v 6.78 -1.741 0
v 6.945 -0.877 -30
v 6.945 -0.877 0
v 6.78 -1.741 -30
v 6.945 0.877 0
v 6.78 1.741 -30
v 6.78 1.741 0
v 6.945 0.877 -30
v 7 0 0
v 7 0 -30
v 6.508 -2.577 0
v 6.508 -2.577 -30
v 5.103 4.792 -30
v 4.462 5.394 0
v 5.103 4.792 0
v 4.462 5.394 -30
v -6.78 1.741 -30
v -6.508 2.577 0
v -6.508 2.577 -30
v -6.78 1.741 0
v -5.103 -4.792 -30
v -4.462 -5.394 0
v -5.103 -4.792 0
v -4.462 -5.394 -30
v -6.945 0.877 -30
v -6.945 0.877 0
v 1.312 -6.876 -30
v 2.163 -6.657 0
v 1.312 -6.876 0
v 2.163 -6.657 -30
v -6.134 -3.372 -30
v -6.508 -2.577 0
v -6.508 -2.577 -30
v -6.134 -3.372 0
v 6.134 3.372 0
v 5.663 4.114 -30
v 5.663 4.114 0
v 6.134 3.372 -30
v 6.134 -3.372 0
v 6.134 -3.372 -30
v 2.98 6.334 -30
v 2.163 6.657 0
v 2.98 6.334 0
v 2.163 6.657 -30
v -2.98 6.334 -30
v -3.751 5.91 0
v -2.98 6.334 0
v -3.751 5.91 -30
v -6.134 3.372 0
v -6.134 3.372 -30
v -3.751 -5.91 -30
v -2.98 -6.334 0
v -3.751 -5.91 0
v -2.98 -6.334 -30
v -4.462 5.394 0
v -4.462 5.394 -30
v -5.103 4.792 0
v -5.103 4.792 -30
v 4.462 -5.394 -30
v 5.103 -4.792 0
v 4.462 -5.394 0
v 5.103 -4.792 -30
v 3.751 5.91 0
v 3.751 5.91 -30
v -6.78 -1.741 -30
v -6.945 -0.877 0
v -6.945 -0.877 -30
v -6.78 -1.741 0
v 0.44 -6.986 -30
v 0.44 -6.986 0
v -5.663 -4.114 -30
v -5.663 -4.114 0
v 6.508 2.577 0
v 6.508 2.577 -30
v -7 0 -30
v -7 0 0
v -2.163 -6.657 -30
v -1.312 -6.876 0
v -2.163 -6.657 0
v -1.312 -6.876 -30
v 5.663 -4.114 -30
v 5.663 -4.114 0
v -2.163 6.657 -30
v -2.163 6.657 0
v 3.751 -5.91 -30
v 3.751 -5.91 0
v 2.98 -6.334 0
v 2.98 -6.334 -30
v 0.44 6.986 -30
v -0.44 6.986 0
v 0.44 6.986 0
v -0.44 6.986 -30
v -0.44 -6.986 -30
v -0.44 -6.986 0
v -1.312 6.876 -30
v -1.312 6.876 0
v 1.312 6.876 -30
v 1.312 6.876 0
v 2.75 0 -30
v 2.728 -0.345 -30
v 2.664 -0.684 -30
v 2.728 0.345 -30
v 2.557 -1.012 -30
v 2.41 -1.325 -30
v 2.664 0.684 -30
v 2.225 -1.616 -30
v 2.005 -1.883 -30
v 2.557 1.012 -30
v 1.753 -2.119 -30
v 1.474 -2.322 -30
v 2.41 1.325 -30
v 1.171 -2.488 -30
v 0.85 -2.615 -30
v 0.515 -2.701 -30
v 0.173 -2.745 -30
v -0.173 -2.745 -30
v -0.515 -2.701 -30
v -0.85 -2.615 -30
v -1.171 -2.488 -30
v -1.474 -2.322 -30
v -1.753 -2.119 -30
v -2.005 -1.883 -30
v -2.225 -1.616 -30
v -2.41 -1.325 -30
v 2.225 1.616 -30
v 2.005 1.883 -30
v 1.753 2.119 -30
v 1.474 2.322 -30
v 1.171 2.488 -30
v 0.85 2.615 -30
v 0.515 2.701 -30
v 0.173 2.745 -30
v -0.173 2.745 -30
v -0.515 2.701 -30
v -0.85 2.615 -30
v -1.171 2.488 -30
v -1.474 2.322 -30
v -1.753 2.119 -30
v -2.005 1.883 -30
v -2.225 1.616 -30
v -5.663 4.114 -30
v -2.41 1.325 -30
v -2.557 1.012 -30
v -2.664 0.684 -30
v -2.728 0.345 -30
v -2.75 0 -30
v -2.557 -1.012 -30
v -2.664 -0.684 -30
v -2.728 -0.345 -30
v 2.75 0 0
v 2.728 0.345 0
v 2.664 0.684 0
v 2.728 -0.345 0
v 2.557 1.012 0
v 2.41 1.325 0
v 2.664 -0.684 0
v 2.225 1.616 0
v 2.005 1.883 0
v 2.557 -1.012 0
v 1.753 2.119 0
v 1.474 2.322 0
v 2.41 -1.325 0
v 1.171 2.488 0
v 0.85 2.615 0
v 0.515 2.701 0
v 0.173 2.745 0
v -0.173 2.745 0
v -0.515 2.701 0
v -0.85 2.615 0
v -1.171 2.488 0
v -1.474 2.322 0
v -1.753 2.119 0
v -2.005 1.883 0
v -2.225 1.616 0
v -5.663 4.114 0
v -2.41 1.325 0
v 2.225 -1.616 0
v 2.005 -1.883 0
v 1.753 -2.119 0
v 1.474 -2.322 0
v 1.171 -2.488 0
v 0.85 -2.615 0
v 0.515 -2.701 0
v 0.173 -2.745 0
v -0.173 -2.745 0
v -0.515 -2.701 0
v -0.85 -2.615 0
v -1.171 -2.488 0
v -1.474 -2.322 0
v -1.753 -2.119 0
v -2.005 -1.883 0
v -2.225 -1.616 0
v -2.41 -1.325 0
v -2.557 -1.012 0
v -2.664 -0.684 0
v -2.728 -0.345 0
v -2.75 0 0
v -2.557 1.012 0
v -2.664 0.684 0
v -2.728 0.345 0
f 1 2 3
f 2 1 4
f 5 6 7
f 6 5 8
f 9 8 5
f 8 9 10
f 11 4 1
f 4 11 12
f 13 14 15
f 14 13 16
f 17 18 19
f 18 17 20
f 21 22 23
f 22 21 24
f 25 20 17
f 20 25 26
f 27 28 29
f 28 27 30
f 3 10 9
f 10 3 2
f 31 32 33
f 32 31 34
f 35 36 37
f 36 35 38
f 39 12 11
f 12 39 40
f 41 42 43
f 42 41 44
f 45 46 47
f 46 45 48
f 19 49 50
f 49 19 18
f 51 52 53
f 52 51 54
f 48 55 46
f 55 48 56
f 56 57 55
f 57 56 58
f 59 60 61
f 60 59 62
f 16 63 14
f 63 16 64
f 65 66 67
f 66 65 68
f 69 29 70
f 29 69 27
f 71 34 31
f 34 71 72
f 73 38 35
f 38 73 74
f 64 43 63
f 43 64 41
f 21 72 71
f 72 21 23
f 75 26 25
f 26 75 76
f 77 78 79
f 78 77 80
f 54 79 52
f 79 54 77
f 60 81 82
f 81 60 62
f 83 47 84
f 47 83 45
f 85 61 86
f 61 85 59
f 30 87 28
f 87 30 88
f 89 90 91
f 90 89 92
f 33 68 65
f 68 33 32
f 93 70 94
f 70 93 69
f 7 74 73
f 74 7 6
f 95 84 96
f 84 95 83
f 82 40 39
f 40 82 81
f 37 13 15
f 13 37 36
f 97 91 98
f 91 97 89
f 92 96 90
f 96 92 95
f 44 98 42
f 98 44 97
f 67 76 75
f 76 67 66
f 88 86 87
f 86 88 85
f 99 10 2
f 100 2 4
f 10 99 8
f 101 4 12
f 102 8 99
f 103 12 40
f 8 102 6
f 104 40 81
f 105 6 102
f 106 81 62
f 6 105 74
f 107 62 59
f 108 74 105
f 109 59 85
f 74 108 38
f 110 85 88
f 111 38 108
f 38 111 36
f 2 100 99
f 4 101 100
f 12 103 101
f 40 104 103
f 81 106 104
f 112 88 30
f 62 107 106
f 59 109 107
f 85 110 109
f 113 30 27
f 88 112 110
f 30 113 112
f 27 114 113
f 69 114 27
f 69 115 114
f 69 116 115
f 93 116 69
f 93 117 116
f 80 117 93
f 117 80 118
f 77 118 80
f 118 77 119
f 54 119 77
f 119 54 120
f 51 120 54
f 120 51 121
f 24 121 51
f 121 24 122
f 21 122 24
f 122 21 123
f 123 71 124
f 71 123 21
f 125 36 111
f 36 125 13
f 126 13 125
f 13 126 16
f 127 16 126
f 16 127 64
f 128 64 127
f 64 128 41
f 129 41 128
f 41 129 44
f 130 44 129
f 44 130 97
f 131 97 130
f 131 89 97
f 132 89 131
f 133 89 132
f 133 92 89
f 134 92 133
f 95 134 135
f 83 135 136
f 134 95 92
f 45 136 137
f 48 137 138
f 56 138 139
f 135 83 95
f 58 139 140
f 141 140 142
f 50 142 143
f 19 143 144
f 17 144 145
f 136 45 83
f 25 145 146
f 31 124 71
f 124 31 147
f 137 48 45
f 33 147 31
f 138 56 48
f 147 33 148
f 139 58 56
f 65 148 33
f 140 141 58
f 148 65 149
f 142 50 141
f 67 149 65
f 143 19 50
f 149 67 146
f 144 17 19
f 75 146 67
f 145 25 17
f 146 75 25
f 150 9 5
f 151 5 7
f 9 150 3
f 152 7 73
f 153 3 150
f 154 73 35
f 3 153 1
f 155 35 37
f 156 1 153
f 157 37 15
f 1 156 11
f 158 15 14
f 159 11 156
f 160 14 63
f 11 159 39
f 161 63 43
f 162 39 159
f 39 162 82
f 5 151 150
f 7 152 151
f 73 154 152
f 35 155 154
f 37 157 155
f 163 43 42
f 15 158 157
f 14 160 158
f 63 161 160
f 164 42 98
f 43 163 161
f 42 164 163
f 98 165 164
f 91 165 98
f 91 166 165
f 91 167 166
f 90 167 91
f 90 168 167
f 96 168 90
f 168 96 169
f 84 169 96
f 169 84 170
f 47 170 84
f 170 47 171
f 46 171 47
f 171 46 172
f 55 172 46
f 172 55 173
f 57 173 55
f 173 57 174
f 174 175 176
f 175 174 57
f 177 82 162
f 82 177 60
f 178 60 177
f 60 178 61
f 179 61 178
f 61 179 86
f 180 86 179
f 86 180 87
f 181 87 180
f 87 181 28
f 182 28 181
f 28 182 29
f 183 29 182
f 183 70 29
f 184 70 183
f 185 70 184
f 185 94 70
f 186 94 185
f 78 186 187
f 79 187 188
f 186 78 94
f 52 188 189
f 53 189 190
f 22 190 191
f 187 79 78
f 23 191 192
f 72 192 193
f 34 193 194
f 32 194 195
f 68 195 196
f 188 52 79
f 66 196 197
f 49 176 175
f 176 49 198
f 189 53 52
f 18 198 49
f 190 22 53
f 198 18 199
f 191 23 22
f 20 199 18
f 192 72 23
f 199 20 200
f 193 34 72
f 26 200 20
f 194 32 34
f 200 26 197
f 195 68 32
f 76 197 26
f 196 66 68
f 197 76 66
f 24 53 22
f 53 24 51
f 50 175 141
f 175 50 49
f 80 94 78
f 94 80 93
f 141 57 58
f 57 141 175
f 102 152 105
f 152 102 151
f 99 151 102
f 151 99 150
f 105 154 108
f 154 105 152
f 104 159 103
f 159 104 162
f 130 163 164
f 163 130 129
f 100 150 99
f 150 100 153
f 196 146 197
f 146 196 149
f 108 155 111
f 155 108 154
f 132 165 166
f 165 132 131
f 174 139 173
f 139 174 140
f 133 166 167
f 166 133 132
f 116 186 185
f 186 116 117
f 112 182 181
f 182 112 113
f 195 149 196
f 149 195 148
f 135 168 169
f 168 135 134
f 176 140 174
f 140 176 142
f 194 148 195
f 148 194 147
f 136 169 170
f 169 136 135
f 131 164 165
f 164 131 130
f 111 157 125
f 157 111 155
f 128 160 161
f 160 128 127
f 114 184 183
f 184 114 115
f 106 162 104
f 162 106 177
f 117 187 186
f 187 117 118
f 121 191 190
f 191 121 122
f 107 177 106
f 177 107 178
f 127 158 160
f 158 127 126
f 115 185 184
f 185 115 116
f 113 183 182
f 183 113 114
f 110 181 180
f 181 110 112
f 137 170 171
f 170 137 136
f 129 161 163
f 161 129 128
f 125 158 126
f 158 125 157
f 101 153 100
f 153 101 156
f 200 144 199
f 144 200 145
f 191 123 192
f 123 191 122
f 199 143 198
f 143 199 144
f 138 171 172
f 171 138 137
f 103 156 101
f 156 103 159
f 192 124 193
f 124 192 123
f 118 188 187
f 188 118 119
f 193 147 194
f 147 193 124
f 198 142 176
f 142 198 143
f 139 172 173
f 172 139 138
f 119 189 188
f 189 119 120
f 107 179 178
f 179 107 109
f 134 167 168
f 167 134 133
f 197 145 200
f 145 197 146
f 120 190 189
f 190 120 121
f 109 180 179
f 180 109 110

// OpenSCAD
$fn = 50;


difference() {
	union() {
		translate(v = [0, 0, -30.0000000000]) {
			cylinder(h = 30, r = 7.0000000000);
		}
	}
	union() {
		#translate(v = [0, 0, -30]) {
			cylinder(h = 30, r = 2.7500000000);
		}
	}
}
